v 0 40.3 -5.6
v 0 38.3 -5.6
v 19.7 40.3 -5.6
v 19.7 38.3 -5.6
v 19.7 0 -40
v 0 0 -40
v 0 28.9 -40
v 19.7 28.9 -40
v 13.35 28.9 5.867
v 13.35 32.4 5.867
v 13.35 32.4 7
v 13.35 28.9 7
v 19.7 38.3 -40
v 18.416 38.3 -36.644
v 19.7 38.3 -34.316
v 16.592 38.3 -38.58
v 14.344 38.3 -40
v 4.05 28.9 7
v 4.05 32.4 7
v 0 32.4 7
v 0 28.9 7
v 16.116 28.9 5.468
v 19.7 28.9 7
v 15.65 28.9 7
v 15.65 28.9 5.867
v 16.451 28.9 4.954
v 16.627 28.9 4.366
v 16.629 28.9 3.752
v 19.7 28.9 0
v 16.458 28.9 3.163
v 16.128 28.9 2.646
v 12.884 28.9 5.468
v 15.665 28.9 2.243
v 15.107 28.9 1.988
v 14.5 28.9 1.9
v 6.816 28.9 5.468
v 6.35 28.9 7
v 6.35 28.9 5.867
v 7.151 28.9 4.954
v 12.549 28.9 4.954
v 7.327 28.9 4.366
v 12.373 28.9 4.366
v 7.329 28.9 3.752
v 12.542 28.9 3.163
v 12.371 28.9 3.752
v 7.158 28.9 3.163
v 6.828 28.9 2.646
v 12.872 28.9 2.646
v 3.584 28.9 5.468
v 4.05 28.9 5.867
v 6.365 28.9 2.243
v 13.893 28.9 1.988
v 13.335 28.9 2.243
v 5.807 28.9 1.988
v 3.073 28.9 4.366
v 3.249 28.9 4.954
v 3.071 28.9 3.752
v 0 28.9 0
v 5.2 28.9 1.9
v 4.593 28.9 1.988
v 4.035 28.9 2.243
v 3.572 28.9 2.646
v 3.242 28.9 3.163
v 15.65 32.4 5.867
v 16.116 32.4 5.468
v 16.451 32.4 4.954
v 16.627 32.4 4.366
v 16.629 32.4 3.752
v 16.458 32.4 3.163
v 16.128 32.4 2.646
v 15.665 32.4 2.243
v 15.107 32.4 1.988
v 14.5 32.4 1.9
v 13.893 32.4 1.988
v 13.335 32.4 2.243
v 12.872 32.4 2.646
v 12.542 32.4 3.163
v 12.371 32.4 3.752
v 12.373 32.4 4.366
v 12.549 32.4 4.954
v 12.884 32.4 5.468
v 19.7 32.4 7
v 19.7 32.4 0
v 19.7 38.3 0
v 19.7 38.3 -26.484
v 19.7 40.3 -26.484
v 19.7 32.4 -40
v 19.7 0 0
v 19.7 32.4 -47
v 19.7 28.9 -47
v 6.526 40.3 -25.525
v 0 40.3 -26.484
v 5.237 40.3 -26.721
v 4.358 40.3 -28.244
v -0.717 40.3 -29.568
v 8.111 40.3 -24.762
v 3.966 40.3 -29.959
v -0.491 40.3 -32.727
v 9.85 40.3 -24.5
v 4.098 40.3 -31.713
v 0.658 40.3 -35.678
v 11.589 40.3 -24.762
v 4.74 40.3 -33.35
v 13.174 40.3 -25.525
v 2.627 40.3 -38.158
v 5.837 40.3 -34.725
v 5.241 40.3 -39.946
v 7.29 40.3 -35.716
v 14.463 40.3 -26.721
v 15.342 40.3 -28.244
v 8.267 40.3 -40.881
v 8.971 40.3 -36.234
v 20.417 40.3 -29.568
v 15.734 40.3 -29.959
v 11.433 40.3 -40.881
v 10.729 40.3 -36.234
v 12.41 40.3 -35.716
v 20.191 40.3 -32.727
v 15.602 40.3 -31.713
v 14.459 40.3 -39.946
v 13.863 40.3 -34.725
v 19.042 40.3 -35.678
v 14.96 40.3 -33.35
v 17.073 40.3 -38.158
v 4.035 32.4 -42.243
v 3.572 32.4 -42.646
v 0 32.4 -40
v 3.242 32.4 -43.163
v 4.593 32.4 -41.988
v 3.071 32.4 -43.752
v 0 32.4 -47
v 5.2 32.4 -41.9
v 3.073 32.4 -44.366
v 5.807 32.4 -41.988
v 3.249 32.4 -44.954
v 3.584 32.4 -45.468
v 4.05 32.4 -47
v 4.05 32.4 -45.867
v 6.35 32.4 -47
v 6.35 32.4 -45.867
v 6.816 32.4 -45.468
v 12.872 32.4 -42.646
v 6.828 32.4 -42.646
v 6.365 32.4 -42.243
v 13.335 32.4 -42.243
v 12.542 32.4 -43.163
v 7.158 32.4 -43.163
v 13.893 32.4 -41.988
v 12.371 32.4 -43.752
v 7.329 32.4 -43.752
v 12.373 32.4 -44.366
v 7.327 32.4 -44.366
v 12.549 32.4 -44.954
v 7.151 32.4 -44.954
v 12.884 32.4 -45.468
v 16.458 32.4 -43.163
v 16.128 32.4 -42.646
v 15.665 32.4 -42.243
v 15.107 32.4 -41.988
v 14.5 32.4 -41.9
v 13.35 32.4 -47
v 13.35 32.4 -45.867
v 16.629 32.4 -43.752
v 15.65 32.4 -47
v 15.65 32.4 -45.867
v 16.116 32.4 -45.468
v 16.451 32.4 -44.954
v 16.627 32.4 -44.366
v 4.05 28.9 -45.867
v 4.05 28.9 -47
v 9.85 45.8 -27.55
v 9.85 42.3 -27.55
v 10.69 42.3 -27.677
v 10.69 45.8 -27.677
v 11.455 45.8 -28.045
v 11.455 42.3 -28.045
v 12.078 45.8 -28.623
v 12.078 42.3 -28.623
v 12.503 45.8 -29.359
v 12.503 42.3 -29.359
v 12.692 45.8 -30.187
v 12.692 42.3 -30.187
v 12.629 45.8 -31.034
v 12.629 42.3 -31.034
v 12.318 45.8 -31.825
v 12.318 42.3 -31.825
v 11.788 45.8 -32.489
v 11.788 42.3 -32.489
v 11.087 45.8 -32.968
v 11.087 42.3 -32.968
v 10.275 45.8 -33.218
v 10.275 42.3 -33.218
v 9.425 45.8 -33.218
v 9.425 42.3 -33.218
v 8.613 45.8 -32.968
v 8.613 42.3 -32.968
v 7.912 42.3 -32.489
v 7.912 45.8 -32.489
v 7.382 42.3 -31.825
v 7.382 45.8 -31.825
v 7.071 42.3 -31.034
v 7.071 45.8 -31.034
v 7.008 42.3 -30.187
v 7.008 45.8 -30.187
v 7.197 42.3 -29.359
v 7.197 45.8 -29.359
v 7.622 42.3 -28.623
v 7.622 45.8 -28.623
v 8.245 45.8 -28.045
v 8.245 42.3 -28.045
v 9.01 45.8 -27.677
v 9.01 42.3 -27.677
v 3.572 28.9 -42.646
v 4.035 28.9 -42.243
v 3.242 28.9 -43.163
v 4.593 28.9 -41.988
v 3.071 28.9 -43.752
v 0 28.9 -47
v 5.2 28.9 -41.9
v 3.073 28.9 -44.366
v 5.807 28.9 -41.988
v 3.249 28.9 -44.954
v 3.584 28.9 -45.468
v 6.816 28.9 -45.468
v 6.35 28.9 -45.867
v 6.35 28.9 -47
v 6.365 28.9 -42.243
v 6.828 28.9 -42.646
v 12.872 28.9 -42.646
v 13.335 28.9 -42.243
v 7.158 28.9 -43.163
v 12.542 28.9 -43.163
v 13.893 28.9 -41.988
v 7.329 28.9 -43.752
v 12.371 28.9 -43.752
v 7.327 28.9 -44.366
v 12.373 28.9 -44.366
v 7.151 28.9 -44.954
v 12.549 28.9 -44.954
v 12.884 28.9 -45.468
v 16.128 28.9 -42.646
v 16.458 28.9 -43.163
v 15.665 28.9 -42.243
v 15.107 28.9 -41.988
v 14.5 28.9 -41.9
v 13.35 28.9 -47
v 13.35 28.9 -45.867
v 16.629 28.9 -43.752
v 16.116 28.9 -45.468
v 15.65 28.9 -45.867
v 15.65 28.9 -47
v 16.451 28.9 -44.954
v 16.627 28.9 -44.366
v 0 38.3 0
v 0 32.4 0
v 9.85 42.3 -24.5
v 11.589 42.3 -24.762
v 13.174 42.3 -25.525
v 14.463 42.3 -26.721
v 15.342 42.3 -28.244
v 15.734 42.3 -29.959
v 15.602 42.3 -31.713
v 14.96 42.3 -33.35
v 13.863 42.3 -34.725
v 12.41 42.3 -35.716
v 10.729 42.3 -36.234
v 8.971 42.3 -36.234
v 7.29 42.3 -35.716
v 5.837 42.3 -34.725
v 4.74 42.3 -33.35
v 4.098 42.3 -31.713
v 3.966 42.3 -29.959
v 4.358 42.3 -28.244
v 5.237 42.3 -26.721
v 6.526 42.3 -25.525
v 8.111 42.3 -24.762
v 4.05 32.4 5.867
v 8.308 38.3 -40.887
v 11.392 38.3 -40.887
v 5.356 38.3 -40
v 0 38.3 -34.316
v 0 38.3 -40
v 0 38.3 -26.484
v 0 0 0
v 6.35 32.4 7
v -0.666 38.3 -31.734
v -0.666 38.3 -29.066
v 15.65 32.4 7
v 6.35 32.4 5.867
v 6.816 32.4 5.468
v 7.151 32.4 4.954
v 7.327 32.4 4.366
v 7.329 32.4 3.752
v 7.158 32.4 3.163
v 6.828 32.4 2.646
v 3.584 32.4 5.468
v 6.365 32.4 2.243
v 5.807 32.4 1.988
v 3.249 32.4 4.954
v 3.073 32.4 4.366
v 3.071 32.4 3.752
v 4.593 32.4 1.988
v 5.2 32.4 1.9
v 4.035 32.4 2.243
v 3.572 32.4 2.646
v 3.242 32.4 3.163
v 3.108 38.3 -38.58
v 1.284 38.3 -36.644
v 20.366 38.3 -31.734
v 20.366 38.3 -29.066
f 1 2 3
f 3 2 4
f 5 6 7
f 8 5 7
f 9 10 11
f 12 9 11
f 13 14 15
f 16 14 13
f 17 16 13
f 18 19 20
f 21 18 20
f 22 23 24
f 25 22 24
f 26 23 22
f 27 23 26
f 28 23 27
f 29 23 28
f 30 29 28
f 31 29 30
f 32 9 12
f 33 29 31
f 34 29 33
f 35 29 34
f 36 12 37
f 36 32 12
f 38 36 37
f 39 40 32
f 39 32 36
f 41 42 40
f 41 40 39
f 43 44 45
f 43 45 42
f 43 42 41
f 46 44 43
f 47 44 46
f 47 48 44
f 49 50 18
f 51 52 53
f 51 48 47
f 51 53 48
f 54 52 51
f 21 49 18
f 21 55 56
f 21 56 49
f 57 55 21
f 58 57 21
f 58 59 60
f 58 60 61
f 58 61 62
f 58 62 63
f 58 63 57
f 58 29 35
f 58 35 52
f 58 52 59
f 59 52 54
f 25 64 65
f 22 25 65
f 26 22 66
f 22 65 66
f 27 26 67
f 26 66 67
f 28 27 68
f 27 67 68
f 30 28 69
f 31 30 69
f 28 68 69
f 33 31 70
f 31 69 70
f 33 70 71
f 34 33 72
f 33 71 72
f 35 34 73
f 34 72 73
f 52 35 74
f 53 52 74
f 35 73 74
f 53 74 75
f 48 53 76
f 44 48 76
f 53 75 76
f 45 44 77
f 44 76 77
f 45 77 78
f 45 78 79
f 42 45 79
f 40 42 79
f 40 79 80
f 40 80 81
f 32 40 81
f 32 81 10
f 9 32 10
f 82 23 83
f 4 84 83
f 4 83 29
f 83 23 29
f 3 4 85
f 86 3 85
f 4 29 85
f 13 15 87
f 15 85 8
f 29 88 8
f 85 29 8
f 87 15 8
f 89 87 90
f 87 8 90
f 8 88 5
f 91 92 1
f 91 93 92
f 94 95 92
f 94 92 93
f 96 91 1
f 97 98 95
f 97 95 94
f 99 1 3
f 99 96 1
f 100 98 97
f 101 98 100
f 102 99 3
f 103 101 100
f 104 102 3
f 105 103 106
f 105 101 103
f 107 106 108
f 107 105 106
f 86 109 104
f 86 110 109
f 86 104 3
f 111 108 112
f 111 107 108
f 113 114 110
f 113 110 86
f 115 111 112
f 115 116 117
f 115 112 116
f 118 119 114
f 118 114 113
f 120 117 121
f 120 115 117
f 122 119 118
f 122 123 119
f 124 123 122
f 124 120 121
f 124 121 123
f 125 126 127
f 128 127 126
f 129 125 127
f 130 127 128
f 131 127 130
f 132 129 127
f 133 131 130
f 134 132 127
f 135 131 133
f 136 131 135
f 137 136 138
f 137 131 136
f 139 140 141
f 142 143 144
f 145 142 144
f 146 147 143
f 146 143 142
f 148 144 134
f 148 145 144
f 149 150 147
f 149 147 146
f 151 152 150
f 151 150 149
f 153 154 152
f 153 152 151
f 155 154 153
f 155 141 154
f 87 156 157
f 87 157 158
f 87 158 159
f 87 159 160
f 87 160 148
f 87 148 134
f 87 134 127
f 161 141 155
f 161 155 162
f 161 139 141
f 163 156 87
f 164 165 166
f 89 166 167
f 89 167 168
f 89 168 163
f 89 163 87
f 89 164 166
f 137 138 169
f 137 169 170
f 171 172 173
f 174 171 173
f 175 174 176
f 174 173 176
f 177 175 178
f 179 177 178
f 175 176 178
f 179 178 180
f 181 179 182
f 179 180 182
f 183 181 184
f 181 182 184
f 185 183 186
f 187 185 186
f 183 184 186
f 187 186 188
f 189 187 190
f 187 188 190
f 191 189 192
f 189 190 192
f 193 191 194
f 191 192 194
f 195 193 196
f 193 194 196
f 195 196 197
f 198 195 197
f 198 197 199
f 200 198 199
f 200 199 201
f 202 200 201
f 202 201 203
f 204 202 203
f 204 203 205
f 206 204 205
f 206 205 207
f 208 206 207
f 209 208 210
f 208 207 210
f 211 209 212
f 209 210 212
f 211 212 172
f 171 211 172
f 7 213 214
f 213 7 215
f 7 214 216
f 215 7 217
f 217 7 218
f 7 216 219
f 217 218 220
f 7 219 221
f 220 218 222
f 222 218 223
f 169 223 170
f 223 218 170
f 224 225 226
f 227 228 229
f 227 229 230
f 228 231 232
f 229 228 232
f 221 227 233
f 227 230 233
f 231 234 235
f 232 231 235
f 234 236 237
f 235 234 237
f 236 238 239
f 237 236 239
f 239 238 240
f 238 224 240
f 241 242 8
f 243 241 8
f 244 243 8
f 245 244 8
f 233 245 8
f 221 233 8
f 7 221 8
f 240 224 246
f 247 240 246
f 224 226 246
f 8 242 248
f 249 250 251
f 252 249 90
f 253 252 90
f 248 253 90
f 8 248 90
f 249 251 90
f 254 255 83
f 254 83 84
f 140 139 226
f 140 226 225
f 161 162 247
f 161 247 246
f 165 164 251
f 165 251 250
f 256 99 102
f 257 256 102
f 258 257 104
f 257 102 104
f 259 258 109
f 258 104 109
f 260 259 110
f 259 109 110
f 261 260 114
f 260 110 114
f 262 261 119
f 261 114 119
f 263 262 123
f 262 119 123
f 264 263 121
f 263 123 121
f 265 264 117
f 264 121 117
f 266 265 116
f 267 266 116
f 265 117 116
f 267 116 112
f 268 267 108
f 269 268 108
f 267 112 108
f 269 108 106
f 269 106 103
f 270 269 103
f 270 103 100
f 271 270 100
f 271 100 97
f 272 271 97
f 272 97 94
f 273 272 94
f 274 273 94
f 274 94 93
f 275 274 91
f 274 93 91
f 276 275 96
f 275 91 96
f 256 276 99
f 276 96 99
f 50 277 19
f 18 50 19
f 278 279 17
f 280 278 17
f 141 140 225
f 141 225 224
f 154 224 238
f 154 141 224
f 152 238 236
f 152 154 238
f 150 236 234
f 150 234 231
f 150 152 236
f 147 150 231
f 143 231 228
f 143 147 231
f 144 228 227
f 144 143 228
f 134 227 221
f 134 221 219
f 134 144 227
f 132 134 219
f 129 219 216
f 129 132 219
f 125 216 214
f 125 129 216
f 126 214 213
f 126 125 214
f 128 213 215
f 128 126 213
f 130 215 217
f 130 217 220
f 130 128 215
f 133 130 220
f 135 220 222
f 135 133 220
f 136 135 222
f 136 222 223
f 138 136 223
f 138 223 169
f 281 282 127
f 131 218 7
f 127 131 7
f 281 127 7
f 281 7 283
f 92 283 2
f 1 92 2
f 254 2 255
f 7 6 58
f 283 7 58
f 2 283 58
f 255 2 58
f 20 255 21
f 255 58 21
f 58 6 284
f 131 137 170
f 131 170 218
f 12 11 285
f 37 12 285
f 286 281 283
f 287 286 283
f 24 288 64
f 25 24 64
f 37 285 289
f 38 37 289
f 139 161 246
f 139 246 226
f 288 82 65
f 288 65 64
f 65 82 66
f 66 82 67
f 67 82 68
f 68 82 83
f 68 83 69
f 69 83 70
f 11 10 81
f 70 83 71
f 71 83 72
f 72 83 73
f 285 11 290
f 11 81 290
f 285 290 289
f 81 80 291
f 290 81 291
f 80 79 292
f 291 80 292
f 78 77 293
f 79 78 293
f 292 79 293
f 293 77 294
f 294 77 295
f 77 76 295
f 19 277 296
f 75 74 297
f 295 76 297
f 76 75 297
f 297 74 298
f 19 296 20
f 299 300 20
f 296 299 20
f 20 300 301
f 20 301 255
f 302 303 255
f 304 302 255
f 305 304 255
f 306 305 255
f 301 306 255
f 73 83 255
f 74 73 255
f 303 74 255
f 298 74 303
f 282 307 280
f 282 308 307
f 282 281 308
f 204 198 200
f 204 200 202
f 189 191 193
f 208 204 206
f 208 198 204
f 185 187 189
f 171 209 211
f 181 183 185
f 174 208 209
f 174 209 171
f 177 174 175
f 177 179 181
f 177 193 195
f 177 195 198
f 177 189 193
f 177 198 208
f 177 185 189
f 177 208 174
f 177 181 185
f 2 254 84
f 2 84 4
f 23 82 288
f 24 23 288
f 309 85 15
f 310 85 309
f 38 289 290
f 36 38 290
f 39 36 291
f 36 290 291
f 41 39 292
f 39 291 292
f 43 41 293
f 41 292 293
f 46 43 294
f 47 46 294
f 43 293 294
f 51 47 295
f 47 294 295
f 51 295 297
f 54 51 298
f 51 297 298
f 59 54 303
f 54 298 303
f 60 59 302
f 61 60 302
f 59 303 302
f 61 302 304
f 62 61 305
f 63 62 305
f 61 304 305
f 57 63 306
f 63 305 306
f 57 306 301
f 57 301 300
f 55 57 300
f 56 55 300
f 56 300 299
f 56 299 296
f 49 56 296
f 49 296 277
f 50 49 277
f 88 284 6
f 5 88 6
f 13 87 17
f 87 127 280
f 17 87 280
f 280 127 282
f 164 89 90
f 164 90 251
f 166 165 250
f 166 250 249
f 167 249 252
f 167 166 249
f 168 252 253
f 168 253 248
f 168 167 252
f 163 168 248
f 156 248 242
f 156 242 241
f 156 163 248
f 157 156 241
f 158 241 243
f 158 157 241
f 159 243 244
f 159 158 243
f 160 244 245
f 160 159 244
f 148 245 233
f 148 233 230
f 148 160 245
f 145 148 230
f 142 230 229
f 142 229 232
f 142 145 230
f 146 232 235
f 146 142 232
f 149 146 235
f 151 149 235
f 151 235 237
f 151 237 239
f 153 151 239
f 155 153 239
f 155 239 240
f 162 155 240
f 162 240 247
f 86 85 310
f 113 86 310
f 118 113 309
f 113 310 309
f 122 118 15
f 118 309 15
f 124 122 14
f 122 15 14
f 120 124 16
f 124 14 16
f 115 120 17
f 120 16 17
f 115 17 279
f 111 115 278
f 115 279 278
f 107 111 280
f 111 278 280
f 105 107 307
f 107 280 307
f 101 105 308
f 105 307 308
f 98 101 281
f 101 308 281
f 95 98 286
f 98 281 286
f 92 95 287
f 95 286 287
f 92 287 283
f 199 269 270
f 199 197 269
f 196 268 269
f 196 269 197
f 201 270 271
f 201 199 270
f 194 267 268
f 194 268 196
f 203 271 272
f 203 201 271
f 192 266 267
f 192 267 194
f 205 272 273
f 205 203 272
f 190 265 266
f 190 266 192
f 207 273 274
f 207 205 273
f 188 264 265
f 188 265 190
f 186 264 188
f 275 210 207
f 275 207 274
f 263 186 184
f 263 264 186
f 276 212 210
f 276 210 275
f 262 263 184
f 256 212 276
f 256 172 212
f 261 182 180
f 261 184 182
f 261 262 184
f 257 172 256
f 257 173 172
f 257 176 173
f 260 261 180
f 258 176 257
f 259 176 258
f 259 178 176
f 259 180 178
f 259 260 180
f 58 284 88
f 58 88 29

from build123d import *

# Parameters (mm, degrees)
CROQUIS1_W              = 40
CROQUIS1_H              = 38.3
SALIENTE_EXTRUIR1_DEPTH = 19.7
SALIENTE_EXTRUIR2_DEPTH = 2
CROQUIS3_R              = 5.9
SALIENTE_EXTRUIR3_DEPTH = 2
CROQUIS4_R              = 2.85
SALIENTE_EXTRUIR4_DEPTH = 3.5
SALIENTE_EXTRUIR5_DEPTH = 3.5


with BuildPart() as part:
    # Croquis1 → Saliente-Extruir1 (new body)
    with BuildSketch(Plane(origin=(0, 0, 0), x_dir=(0, 0, -1), z_dir=(1, 0, 0))):
        with Locations((20, 19.15)):
            Rectangle(CROQUIS1_W, CROQUIS1_H)
    extrude(amount=SALIENTE_EXTRUIR1_DEPTH)

    # Croquis2 → Saliente-Extruir2 (add)
    with BuildSketch(Plane(origin=(0, 38.3, 0), x_dir=(1, 0, 0), z_dir=(0, 1, 0))):
        with BuildLine():
            Line((0, 5.6), (19.7, 5.6))
            Line((19.7, 5.6), (19.7, 26.483687959))
            ThreePointArc((19.7, 26.483687959), (9.85, 41), (0, 26.483687959))
            Line((0, 26.483687959), (0, 5.6))
        make_face()
    extrude(amount=SALIENTE_EXTRUIR2_DEPTH)

    # Croquis3 → Saliente-Extruir3 (add)
    with BuildSketch(Plane(origin=(0, 40.3, 0), x_dir=(1, 0, 0), z_dir=(0, 1, 0))):
        with Locations(Location((9.85, 30.4, 0), (0, 0, 270))):
            Circle(CROQUIS3_R)
    extrude(amount=SALIENTE_EXTRUIR3_DEPTH)

    # Croquis4 → Saliente-Extruir4 (add)
    with BuildSketch(Plane(origin=(0, 42.3, 0), x_dir=(1, 0, 0), z_dir=(0, 1, 0))):
        with Locations(Location((9.85, 30.4, 0), (0, 0, 270))):
            Circle(CROQUIS4_R)
    extrude(amount=SALIENTE_EXTRUIR4_DEPTH)

    # Croquis5 → Saliente-Extruir5 (add)
    with BuildSketch(Plane(origin=(0, 32.4, 0), x_dir=(1, 0, 0), z_dir=(0, 1, 0))):
        with BuildLine():
            Line((0, 0), (19.7, 0))
            Line((19.7, 0), (19.7, -7))
            Line((19.7, -7), (15.65, -7))
            Line((15.65, -7), (15.65, -5.866590212))
            ThreePointArc((15.65, -5.866590212), (14.5, -1.9), (13.35, -5.866590212))
            Line((13.35, -5.866590212), (13.35, -7))
            Line((13.35, -7), (6.35, -7))
            Line((6.35, -7), (6.35, -5.866590212))
            ThreePointArc((6.35, -5.866590212), (5.2, -1.9), (4.05, -5.866590212))
            Line((4.05, -5.866590212), (4.05, -7))
            Line((4.05, -7), (0, -7))
            Line((0, -7), (0, 0))
        make_face()
        with BuildLine():
            Line((0, 40), (19.7, 40))
            Line((19.7, 40), (19.7, 47))
            Line((19.7, 47), (15.65, 47))
            Line((15.65, 47), (15.65, 45.866590212))
            ThreePointArc((15.65, 45.866590212), (14.5, 41.9), (13.35, 45.866590212))
            Line((13.35, 45.866590212), (13.35, 47))
            Line((13.35, 47), (6.35, 47))
            Line((6.35, 47), (6.35, 45.866590212))
            ThreePointArc((6.35, 45.866590212), (5.2, 41.9), (4.05, 45.866590212))
            Line((4.05, 45.866590212), (4.05, 47))
            Line((4.05, 47), (0, 47))
            Line((0, 47), (0, 40))
        make_face()
    extrude(amount=-SALIENTE_EXTRUIR5_DEPTH)


solid = part.part
